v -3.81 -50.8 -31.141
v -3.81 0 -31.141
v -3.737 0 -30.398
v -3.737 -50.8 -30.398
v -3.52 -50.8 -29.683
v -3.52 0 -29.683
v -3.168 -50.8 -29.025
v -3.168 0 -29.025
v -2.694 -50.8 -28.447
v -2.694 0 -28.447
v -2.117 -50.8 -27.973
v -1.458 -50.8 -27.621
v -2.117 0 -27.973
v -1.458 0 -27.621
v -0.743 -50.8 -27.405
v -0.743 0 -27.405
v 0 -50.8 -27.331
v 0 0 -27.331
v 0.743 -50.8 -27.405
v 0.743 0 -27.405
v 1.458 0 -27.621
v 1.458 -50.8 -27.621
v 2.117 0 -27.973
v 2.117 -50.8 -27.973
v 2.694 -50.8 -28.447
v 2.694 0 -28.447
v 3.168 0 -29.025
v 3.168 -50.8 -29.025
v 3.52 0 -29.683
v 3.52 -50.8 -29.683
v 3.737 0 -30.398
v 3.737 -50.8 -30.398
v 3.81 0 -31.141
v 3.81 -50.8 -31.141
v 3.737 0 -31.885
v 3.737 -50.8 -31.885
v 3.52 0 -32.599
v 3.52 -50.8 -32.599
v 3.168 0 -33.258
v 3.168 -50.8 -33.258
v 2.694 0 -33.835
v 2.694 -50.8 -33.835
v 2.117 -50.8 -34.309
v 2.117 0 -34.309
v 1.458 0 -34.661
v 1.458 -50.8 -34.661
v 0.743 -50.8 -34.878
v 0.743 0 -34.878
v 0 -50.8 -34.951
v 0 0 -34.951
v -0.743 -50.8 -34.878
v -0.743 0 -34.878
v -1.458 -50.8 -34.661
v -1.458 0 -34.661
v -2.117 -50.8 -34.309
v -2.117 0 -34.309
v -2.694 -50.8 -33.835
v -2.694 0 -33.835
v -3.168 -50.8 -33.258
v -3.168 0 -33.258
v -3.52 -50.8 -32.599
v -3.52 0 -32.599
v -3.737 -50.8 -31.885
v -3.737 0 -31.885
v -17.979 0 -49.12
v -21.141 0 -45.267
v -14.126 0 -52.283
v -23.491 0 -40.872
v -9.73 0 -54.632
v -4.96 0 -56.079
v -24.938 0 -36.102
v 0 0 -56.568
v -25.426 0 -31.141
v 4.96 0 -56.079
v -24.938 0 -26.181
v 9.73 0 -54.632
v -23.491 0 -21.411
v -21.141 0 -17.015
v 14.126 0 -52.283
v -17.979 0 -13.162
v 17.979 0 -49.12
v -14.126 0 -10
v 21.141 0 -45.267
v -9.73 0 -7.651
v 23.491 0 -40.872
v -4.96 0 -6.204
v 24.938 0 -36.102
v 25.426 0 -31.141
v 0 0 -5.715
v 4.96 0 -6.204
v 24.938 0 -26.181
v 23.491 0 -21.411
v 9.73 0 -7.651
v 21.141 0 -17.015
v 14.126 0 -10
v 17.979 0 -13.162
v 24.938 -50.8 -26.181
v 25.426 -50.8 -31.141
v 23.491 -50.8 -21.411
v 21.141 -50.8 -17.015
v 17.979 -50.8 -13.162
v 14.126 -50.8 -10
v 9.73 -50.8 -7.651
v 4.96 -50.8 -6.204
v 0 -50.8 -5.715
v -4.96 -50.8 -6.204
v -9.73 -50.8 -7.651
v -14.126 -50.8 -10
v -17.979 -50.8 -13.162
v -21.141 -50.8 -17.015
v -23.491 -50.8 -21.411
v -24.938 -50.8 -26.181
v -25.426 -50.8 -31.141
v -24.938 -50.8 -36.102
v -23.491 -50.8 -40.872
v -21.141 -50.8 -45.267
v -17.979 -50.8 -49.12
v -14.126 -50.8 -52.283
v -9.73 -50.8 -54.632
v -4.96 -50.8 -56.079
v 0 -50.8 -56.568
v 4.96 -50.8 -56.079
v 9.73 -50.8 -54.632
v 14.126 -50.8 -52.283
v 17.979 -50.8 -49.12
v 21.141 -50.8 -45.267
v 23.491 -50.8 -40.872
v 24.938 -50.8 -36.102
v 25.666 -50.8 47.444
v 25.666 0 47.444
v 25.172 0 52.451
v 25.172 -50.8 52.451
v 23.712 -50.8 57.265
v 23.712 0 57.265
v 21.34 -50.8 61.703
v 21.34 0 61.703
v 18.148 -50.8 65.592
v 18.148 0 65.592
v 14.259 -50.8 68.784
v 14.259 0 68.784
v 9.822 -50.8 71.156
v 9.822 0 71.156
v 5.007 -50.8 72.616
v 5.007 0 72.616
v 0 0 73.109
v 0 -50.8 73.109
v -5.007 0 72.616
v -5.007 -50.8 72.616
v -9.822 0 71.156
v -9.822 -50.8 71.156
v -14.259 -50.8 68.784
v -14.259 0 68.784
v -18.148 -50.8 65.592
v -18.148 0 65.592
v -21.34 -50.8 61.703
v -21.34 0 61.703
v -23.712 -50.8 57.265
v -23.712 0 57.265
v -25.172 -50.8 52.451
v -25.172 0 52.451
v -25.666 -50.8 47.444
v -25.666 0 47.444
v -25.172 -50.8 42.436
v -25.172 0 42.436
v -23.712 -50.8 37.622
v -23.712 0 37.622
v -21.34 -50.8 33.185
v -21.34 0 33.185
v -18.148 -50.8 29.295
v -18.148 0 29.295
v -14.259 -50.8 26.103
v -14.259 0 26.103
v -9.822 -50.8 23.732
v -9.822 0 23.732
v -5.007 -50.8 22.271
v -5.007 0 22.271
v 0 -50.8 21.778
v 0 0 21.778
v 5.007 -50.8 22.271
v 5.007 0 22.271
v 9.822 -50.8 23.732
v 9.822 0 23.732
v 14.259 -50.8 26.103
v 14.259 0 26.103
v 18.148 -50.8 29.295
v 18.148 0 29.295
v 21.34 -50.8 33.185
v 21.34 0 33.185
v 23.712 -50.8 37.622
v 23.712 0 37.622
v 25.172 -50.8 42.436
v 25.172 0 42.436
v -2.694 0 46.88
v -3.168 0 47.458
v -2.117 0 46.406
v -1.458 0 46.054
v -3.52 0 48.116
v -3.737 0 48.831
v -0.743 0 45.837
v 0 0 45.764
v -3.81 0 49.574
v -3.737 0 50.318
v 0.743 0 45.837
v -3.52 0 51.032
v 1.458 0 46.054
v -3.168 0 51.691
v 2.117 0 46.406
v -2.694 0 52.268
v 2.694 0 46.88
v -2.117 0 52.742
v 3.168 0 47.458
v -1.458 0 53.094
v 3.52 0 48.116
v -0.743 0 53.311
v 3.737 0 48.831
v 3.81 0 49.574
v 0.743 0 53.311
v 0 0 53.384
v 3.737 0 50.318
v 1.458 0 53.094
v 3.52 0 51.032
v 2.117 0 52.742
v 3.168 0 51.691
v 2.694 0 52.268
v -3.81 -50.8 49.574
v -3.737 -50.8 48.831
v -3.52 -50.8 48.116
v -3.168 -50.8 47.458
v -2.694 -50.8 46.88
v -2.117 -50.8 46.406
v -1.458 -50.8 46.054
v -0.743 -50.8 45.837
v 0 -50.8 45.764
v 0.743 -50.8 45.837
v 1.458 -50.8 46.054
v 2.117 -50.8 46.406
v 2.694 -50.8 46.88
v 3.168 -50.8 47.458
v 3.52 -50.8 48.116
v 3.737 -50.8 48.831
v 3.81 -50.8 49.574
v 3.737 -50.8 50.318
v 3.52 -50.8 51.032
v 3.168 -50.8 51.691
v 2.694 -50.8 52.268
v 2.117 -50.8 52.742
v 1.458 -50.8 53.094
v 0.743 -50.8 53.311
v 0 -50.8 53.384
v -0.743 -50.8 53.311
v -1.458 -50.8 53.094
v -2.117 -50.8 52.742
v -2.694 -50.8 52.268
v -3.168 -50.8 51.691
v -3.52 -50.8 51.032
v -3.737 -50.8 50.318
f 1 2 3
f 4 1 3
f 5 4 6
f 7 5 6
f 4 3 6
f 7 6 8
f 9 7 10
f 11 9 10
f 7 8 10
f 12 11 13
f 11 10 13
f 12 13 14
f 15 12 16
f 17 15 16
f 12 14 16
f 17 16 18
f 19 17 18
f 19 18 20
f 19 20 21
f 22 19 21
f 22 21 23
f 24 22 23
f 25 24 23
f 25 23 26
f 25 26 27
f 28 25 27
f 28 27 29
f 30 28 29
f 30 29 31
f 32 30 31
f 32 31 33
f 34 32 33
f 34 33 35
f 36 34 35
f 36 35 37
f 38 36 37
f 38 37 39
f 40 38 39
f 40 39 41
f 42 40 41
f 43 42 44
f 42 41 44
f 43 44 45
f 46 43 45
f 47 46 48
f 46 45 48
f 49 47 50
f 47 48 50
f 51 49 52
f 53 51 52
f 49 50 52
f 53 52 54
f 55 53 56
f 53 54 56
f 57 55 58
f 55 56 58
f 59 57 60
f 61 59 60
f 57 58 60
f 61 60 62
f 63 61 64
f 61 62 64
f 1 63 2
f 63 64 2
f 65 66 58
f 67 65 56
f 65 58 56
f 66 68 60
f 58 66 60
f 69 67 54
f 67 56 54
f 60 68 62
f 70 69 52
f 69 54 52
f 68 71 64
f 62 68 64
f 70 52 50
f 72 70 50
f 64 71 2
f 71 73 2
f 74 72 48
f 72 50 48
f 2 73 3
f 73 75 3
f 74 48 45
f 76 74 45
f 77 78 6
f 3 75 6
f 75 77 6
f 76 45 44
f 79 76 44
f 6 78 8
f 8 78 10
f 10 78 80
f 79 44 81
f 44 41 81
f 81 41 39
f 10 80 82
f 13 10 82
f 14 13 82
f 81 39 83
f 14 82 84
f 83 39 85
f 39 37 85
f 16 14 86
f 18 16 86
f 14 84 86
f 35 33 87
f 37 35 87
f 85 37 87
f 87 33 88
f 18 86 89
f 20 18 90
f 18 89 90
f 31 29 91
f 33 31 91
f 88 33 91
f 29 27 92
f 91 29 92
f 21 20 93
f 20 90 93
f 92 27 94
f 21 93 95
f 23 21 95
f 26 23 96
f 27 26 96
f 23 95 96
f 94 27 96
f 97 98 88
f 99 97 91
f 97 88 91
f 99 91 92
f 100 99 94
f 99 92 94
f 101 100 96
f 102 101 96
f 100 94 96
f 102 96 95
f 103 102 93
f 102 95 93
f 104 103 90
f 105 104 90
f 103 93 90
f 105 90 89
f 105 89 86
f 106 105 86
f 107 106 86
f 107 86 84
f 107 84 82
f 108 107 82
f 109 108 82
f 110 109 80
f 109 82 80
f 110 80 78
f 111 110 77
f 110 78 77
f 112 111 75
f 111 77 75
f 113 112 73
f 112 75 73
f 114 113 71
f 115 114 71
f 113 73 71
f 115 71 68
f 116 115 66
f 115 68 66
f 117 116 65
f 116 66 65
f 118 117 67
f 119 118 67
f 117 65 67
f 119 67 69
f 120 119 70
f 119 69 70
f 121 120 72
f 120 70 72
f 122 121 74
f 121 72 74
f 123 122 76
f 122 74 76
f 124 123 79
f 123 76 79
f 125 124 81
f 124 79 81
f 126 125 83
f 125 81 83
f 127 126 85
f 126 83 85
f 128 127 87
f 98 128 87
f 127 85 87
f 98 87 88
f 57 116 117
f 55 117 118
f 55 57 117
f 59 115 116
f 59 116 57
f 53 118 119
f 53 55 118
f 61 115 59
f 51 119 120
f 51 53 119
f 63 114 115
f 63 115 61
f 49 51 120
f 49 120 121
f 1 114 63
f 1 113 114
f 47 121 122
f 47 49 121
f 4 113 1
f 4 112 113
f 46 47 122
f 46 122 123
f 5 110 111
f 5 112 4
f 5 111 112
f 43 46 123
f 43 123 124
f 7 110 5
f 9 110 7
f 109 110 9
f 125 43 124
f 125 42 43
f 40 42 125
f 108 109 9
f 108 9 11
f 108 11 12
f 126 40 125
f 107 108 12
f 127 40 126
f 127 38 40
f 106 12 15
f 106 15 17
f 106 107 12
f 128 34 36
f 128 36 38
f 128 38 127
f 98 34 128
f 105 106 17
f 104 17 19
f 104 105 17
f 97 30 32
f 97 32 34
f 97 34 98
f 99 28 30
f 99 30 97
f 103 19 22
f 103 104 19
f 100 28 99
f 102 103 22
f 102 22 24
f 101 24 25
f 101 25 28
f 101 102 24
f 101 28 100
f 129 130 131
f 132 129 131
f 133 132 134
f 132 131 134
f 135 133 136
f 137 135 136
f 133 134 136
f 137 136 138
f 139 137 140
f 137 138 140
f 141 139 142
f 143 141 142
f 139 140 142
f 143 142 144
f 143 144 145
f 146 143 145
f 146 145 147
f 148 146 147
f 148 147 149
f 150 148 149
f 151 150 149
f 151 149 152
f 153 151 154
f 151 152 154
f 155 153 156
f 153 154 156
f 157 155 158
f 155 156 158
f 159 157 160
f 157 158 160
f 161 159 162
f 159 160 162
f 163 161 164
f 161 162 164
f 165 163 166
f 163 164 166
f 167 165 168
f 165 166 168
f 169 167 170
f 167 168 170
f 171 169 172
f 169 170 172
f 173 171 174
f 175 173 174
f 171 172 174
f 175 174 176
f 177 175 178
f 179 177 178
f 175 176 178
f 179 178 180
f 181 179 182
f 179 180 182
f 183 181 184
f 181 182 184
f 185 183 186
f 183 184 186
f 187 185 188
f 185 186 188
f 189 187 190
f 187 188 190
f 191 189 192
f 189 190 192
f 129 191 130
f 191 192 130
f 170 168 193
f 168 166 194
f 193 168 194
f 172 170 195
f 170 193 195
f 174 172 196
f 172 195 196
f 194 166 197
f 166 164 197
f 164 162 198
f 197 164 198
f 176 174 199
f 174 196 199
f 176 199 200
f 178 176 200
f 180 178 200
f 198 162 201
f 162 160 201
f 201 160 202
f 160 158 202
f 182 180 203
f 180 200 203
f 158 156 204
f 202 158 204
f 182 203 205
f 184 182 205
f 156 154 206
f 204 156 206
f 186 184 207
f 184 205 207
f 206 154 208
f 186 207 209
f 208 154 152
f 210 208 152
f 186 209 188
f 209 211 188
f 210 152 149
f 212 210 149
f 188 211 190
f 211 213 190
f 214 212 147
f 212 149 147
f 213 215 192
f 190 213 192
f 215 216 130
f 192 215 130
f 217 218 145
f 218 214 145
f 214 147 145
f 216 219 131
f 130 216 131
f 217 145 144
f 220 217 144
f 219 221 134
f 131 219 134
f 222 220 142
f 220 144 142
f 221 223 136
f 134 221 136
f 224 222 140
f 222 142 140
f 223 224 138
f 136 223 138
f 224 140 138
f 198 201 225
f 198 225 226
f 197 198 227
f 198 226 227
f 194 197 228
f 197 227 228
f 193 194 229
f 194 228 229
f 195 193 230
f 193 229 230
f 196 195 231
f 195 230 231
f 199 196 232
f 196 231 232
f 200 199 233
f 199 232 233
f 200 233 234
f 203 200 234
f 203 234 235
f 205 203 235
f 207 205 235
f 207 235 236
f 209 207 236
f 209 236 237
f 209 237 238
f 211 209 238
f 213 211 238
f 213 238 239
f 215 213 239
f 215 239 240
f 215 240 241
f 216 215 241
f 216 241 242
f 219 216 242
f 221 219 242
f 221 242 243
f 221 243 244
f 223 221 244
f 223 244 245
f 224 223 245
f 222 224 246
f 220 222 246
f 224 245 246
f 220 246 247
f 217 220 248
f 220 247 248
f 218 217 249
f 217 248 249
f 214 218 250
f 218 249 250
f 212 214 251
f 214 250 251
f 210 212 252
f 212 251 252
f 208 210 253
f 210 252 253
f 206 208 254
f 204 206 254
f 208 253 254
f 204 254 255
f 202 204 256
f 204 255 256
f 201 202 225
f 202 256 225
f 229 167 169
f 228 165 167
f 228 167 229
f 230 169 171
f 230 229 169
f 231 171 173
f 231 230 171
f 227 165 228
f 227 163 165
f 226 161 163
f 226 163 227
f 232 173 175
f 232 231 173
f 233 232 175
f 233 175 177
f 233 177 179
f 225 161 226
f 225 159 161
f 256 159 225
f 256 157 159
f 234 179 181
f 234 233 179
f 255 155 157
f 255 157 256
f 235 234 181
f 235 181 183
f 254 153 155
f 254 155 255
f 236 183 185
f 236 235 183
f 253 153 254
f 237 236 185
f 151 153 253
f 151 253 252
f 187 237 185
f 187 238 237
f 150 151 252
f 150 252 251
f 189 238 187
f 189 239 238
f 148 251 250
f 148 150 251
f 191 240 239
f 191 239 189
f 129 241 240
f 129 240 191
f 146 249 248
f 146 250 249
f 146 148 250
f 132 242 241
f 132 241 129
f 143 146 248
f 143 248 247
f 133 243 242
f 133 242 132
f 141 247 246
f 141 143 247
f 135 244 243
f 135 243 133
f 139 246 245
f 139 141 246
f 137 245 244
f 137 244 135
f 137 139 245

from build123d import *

# Parameters (mm, degrees)
F0_R     = 25.6656549917
F1_DEPTH = 50.8
F0_R_2   = 25.4262657658
F3_D     = 7.62
F5_D     = 7.62


with BuildPart() as f1:
    # F0 (on Front) → F1 (new body)
    with BuildSketch(Plane.XZ):
        with Locations((0, 47.4435910583)):
            Circle(F0_R)
    extrude(amount=F1_DEPTH)

    # F3 (through all)
    with Locations(Plane(origin=(0, 0, 0), x_dir=(1, 0, 0), z_dir=(0, 1, 0))):
        with Locations((0, -49.5742894709)):
            Hole(F3_D / 2)


with BuildPart() as f1b:
    # F0 (on Front) → F1, piece 2 (new body)
    with BuildSketch(Plane.XZ):
        with Locations((0, -31.1413835734)):
            Circle(F0_R_2)
    extrude(amount=F1_DEPTH)

    # F5 (through all)
    with Locations(Plane.XZ.offset(50.8)):
        with Locations((0, -31.1413835734)):
            Hole(F5_D / 2)


solid = Compound([f1.part, f1b.part])
